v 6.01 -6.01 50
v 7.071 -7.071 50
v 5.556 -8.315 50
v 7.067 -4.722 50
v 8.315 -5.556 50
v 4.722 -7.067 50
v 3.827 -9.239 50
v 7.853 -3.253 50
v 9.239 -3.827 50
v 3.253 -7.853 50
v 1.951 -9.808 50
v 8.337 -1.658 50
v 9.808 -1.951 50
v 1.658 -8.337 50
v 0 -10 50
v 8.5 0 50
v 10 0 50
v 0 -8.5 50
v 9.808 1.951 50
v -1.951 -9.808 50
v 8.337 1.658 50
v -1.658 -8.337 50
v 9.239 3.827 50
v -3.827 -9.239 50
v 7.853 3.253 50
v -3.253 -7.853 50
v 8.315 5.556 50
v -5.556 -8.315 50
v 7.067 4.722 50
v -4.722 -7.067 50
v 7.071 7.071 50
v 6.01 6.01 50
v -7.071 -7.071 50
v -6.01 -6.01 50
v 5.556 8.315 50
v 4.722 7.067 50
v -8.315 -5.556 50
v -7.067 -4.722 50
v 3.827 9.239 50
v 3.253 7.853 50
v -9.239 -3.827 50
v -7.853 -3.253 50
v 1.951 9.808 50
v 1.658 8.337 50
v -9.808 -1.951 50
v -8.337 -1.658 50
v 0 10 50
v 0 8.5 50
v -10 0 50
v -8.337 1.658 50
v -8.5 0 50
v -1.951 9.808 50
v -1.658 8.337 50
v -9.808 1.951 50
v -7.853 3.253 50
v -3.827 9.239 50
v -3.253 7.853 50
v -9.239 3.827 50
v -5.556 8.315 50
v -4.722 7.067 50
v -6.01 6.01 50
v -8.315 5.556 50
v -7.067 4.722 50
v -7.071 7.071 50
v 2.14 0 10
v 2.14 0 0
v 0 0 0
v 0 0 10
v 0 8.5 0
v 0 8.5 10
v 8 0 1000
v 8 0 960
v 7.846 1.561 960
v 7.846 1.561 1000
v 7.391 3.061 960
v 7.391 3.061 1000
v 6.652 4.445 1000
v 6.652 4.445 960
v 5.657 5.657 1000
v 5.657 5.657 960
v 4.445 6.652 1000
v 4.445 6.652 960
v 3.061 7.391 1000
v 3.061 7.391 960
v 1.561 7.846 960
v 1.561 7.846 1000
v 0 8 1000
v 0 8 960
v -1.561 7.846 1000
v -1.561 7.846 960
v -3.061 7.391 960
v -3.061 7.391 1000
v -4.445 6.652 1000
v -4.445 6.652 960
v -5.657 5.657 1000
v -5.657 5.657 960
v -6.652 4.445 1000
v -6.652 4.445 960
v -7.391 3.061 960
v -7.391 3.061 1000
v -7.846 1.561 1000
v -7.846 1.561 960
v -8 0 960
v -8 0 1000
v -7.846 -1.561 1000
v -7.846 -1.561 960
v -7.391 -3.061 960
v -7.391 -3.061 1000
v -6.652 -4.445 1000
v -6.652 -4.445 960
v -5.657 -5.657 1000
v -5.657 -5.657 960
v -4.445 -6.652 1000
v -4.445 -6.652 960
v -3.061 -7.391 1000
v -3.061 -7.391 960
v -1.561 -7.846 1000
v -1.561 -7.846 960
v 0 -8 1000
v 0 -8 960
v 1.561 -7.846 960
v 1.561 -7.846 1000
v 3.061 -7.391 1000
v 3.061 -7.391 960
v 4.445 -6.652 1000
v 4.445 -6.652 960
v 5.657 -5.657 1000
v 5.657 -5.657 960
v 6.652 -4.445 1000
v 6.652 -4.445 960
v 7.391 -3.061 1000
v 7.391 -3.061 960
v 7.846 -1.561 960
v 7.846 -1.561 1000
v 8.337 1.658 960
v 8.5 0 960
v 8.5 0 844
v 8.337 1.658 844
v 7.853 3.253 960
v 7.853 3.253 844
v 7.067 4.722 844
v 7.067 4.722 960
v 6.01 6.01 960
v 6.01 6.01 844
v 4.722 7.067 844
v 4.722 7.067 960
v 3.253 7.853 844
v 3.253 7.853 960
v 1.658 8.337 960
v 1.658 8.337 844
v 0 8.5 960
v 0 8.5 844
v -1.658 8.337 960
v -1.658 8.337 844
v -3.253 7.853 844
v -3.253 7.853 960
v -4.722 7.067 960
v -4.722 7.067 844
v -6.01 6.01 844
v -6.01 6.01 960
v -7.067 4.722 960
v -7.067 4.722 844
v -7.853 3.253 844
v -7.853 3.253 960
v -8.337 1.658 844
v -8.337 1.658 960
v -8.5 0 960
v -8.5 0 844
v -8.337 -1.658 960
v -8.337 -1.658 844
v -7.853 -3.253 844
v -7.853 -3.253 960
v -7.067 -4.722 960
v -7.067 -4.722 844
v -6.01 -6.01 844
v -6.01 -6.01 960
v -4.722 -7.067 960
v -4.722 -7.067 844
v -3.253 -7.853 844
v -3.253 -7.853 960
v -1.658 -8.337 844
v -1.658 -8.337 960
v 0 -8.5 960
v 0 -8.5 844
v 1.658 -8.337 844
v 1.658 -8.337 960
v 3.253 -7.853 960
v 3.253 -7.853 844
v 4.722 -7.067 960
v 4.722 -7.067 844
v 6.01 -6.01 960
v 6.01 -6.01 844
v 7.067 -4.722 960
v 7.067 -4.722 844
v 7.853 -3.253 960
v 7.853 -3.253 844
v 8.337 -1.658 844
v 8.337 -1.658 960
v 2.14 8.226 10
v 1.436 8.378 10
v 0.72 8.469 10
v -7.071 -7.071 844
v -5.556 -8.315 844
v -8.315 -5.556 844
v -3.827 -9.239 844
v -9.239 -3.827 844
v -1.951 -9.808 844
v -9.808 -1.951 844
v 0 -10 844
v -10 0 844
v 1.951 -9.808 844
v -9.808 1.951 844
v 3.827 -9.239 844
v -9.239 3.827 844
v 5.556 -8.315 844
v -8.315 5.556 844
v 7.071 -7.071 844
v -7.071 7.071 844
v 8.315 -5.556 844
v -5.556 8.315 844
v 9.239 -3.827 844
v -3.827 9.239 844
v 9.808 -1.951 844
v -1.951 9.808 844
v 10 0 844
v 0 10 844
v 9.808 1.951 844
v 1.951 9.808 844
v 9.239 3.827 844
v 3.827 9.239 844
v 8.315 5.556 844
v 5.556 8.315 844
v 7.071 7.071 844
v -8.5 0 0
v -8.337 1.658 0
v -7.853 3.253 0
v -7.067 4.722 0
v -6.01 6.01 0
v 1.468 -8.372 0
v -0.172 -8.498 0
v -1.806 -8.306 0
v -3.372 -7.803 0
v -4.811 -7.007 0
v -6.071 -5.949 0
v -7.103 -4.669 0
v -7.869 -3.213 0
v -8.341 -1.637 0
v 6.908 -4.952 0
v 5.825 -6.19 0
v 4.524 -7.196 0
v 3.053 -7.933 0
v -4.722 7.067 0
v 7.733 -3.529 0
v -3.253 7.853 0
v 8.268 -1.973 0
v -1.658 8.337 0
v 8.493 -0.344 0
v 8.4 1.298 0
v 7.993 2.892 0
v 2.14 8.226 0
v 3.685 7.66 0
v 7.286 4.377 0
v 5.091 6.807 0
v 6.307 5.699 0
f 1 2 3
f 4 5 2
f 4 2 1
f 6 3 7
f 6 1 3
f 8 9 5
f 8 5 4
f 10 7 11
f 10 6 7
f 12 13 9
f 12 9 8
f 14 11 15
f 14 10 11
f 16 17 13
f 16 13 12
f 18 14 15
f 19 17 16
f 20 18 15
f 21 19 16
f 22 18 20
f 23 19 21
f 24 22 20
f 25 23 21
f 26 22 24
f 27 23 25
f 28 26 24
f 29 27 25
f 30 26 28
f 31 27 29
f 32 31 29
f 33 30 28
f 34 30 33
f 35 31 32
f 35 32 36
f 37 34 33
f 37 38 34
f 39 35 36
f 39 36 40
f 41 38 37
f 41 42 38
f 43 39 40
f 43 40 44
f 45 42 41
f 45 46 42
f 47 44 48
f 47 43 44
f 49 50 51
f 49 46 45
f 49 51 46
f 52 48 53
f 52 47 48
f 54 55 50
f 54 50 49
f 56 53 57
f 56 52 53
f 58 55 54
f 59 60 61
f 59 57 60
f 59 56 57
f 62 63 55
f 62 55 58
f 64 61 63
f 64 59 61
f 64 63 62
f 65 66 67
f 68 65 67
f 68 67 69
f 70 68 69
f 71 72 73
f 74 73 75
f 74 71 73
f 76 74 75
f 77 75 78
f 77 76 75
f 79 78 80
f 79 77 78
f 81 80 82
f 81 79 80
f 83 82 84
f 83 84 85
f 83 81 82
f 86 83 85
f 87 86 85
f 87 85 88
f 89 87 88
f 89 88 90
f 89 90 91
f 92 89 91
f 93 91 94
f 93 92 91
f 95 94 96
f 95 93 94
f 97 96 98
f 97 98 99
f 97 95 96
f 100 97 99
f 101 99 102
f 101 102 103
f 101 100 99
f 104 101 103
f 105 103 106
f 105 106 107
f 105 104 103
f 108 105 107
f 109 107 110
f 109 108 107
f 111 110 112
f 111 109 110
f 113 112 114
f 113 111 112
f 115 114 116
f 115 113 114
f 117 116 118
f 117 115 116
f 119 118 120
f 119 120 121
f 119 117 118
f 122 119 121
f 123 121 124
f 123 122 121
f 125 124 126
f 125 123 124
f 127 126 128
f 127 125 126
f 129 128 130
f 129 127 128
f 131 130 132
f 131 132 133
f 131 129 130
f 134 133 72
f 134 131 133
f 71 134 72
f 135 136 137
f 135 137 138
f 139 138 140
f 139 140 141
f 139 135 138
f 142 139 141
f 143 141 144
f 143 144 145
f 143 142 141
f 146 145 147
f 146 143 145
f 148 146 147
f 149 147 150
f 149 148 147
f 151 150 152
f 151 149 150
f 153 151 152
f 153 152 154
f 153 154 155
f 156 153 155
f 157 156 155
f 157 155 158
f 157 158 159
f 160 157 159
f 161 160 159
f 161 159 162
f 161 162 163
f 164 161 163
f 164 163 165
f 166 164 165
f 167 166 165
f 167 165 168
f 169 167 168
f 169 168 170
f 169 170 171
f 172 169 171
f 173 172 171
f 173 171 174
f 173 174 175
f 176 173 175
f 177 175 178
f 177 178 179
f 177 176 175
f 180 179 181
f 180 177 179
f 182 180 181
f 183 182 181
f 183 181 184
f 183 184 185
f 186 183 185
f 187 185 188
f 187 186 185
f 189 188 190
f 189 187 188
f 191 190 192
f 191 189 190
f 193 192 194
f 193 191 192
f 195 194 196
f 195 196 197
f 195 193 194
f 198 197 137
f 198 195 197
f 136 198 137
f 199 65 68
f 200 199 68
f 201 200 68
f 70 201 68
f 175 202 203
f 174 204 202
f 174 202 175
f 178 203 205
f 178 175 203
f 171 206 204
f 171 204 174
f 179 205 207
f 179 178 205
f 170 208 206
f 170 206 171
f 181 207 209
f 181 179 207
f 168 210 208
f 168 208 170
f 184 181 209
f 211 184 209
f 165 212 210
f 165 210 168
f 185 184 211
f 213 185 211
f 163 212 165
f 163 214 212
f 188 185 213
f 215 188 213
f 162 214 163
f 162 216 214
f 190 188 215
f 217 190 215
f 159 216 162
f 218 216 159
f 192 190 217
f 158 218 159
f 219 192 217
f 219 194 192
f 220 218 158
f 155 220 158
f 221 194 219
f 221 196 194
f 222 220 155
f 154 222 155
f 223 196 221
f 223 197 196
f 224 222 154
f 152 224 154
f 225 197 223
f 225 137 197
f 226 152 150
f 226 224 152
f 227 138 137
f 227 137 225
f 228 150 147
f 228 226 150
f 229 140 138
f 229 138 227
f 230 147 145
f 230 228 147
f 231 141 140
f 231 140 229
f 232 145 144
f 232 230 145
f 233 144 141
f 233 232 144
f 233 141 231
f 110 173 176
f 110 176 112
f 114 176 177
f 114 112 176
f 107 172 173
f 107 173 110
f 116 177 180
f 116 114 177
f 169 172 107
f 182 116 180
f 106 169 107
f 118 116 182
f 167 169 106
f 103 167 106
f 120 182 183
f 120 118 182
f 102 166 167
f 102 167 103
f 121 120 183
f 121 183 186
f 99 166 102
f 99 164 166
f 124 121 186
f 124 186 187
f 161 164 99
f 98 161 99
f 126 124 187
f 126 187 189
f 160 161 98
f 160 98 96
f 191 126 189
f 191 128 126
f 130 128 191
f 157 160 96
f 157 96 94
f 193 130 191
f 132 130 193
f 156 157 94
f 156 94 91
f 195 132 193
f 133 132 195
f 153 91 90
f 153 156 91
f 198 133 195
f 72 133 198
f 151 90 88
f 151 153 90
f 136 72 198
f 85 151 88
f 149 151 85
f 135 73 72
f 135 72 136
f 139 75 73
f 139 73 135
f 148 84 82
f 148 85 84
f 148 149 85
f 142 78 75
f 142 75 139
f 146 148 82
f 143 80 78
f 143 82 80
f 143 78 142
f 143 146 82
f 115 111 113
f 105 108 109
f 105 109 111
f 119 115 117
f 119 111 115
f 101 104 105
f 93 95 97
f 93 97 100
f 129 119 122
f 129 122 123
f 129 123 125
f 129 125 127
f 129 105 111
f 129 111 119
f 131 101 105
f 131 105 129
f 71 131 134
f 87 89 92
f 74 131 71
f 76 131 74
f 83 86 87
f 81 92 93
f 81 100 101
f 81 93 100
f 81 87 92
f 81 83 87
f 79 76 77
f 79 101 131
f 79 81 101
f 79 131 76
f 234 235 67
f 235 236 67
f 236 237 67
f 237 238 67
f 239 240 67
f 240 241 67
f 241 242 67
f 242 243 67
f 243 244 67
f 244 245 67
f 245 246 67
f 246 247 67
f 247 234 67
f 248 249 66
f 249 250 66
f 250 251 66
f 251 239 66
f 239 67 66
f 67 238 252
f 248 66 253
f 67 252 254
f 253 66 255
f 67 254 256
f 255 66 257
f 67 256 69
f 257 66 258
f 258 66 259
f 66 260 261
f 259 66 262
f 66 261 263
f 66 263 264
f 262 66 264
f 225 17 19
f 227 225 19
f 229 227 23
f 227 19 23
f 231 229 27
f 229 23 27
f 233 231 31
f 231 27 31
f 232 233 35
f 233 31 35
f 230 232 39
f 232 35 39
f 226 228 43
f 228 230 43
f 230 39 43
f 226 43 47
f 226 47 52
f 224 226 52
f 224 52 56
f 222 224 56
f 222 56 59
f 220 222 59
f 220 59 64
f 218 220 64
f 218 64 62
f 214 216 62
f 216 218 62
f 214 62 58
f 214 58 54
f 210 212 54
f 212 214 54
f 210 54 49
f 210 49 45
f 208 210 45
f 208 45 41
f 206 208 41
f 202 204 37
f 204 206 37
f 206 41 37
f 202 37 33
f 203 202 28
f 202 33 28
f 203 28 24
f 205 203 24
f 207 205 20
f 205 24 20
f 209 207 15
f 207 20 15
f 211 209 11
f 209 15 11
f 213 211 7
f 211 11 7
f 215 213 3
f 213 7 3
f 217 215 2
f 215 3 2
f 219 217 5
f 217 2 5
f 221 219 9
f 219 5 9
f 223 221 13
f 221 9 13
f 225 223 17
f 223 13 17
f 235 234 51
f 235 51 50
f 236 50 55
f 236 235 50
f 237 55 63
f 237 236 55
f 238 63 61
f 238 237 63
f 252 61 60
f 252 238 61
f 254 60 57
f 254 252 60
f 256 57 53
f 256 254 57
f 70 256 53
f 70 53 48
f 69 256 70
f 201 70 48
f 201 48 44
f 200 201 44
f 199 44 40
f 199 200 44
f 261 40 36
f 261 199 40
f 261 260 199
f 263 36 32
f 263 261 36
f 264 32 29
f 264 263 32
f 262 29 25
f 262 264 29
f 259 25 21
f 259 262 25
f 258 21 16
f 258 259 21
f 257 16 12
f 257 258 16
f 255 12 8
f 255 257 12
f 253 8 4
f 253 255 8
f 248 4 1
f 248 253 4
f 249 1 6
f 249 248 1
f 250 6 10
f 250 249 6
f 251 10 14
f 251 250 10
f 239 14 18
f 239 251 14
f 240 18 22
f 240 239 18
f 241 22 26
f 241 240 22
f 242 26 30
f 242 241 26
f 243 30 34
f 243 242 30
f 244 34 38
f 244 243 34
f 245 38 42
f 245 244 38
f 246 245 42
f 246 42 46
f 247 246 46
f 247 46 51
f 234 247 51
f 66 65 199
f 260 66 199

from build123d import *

# Parameters (mm, degrees)
SCHIZZO1_R                   = 10
ESTRUSIONE_ESTRUSIONE1_DEPTH = 1000
SCHIZZO2_OUTSIDE_W           = 222.08
SCHIZZO2_OUTSIDE_H           = 222.08
SCHIZZO2_OUTSIDE_R           = 8.5
TAGLIO_ESTRUSIONE3_DEPTH     = 156
SCHIZZO3_OUTSIDE_W           = 222.08
SCHIZZO3_OUTSIDE_H           = 222.08
SCHIZZO3_OUTSIDE_R           = 8.5
TAGLIO_ESTRUSIONE4_DEPTH     = 50
SCHIZZO6_OUTSIDE_W           = 222.08
SCHIZZO6_OUTSIDE_H           = 222.08
SCHIZZO6_OUTSIDE_R           = 8
TAGLIO_ESTRUSIONE6_DEPTH     = 40
SCHIZZO7_W                   = 2.140478466
SCHIZZO7_H                   = 11.058829026
TAGLIO_ESTRUSIONE11_DEPTH    = 10


with BuildPart() as part:
    # Schizzo1 → Estrusione-Estrusione1 (new body)
    with BuildSketch(Plane.XY):
        Circle(SCHIZZO1_R)
    extrude(amount=ESTRUSIONE_ESTRUSIONE1_DEPTH)

    # Schizzo2 outside → Taglio-Estrusione3 (cut)
    with BuildSketch(Plane.XY.offset(1000)):
        Rectangle(SCHIZZO2_OUTSIDE_W, SCHIZZO2_OUTSIDE_H)
        Circle(SCHIZZO2_OUTSIDE_R, mode=Mode.SUBTRACT)
    extrude(amount=-TAGLIO_ESTRUSIONE3_DEPTH, mode=Mode.SUBTRACT)

    # Schizzo3 outside → Taglio-Estrusione4 (cut)
    with BuildSketch(Plane(origin=(0, 0, 0), x_dir=(-1, 0, 0), z_dir=(0, 0, -1))):
        Rectangle(SCHIZZO3_OUTSIDE_W, SCHIZZO3_OUTSIDE_H)
        Circle(SCHIZZO3_OUTSIDE_R, mode=Mode.SUBTRACT)
    extrude(amount=-TAGLIO_ESTRUSIONE4_DEPTH, mode=Mode.SUBTRACT)

    # Schizzo6 outside → Taglio-Estrusione6 (cut)
    with BuildSketch(Plane.XY.offset(1000)):
        Rectangle(SCHIZZO6_OUTSIDE_W, SCHIZZO6_OUTSIDE_H)
        Circle(SCHIZZO6_OUTSIDE_R, mode=Mode.SUBTRACT)
    extrude(amount=-TAGLIO_ESTRUSIONE6_DEPTH, mode=Mode.SUBTRACT)

    # Schizzo7 → Taglio-Estrusione11 (cut)
    with BuildSketch(Plane(origin=(0, 0, 0), x_dir=(-1, 0, 0), z_dir=(0, 0, -1))):
        with Locations((-1.070239233, 5.529414513)):
            Rectangle(SCHIZZO7_W, SCHIZZO7_H)
    extrude(amount=-TAGLIO_ESTRUSIONE11_DEPTH, mode=Mode.SUBTRACT)


solid = part.part
